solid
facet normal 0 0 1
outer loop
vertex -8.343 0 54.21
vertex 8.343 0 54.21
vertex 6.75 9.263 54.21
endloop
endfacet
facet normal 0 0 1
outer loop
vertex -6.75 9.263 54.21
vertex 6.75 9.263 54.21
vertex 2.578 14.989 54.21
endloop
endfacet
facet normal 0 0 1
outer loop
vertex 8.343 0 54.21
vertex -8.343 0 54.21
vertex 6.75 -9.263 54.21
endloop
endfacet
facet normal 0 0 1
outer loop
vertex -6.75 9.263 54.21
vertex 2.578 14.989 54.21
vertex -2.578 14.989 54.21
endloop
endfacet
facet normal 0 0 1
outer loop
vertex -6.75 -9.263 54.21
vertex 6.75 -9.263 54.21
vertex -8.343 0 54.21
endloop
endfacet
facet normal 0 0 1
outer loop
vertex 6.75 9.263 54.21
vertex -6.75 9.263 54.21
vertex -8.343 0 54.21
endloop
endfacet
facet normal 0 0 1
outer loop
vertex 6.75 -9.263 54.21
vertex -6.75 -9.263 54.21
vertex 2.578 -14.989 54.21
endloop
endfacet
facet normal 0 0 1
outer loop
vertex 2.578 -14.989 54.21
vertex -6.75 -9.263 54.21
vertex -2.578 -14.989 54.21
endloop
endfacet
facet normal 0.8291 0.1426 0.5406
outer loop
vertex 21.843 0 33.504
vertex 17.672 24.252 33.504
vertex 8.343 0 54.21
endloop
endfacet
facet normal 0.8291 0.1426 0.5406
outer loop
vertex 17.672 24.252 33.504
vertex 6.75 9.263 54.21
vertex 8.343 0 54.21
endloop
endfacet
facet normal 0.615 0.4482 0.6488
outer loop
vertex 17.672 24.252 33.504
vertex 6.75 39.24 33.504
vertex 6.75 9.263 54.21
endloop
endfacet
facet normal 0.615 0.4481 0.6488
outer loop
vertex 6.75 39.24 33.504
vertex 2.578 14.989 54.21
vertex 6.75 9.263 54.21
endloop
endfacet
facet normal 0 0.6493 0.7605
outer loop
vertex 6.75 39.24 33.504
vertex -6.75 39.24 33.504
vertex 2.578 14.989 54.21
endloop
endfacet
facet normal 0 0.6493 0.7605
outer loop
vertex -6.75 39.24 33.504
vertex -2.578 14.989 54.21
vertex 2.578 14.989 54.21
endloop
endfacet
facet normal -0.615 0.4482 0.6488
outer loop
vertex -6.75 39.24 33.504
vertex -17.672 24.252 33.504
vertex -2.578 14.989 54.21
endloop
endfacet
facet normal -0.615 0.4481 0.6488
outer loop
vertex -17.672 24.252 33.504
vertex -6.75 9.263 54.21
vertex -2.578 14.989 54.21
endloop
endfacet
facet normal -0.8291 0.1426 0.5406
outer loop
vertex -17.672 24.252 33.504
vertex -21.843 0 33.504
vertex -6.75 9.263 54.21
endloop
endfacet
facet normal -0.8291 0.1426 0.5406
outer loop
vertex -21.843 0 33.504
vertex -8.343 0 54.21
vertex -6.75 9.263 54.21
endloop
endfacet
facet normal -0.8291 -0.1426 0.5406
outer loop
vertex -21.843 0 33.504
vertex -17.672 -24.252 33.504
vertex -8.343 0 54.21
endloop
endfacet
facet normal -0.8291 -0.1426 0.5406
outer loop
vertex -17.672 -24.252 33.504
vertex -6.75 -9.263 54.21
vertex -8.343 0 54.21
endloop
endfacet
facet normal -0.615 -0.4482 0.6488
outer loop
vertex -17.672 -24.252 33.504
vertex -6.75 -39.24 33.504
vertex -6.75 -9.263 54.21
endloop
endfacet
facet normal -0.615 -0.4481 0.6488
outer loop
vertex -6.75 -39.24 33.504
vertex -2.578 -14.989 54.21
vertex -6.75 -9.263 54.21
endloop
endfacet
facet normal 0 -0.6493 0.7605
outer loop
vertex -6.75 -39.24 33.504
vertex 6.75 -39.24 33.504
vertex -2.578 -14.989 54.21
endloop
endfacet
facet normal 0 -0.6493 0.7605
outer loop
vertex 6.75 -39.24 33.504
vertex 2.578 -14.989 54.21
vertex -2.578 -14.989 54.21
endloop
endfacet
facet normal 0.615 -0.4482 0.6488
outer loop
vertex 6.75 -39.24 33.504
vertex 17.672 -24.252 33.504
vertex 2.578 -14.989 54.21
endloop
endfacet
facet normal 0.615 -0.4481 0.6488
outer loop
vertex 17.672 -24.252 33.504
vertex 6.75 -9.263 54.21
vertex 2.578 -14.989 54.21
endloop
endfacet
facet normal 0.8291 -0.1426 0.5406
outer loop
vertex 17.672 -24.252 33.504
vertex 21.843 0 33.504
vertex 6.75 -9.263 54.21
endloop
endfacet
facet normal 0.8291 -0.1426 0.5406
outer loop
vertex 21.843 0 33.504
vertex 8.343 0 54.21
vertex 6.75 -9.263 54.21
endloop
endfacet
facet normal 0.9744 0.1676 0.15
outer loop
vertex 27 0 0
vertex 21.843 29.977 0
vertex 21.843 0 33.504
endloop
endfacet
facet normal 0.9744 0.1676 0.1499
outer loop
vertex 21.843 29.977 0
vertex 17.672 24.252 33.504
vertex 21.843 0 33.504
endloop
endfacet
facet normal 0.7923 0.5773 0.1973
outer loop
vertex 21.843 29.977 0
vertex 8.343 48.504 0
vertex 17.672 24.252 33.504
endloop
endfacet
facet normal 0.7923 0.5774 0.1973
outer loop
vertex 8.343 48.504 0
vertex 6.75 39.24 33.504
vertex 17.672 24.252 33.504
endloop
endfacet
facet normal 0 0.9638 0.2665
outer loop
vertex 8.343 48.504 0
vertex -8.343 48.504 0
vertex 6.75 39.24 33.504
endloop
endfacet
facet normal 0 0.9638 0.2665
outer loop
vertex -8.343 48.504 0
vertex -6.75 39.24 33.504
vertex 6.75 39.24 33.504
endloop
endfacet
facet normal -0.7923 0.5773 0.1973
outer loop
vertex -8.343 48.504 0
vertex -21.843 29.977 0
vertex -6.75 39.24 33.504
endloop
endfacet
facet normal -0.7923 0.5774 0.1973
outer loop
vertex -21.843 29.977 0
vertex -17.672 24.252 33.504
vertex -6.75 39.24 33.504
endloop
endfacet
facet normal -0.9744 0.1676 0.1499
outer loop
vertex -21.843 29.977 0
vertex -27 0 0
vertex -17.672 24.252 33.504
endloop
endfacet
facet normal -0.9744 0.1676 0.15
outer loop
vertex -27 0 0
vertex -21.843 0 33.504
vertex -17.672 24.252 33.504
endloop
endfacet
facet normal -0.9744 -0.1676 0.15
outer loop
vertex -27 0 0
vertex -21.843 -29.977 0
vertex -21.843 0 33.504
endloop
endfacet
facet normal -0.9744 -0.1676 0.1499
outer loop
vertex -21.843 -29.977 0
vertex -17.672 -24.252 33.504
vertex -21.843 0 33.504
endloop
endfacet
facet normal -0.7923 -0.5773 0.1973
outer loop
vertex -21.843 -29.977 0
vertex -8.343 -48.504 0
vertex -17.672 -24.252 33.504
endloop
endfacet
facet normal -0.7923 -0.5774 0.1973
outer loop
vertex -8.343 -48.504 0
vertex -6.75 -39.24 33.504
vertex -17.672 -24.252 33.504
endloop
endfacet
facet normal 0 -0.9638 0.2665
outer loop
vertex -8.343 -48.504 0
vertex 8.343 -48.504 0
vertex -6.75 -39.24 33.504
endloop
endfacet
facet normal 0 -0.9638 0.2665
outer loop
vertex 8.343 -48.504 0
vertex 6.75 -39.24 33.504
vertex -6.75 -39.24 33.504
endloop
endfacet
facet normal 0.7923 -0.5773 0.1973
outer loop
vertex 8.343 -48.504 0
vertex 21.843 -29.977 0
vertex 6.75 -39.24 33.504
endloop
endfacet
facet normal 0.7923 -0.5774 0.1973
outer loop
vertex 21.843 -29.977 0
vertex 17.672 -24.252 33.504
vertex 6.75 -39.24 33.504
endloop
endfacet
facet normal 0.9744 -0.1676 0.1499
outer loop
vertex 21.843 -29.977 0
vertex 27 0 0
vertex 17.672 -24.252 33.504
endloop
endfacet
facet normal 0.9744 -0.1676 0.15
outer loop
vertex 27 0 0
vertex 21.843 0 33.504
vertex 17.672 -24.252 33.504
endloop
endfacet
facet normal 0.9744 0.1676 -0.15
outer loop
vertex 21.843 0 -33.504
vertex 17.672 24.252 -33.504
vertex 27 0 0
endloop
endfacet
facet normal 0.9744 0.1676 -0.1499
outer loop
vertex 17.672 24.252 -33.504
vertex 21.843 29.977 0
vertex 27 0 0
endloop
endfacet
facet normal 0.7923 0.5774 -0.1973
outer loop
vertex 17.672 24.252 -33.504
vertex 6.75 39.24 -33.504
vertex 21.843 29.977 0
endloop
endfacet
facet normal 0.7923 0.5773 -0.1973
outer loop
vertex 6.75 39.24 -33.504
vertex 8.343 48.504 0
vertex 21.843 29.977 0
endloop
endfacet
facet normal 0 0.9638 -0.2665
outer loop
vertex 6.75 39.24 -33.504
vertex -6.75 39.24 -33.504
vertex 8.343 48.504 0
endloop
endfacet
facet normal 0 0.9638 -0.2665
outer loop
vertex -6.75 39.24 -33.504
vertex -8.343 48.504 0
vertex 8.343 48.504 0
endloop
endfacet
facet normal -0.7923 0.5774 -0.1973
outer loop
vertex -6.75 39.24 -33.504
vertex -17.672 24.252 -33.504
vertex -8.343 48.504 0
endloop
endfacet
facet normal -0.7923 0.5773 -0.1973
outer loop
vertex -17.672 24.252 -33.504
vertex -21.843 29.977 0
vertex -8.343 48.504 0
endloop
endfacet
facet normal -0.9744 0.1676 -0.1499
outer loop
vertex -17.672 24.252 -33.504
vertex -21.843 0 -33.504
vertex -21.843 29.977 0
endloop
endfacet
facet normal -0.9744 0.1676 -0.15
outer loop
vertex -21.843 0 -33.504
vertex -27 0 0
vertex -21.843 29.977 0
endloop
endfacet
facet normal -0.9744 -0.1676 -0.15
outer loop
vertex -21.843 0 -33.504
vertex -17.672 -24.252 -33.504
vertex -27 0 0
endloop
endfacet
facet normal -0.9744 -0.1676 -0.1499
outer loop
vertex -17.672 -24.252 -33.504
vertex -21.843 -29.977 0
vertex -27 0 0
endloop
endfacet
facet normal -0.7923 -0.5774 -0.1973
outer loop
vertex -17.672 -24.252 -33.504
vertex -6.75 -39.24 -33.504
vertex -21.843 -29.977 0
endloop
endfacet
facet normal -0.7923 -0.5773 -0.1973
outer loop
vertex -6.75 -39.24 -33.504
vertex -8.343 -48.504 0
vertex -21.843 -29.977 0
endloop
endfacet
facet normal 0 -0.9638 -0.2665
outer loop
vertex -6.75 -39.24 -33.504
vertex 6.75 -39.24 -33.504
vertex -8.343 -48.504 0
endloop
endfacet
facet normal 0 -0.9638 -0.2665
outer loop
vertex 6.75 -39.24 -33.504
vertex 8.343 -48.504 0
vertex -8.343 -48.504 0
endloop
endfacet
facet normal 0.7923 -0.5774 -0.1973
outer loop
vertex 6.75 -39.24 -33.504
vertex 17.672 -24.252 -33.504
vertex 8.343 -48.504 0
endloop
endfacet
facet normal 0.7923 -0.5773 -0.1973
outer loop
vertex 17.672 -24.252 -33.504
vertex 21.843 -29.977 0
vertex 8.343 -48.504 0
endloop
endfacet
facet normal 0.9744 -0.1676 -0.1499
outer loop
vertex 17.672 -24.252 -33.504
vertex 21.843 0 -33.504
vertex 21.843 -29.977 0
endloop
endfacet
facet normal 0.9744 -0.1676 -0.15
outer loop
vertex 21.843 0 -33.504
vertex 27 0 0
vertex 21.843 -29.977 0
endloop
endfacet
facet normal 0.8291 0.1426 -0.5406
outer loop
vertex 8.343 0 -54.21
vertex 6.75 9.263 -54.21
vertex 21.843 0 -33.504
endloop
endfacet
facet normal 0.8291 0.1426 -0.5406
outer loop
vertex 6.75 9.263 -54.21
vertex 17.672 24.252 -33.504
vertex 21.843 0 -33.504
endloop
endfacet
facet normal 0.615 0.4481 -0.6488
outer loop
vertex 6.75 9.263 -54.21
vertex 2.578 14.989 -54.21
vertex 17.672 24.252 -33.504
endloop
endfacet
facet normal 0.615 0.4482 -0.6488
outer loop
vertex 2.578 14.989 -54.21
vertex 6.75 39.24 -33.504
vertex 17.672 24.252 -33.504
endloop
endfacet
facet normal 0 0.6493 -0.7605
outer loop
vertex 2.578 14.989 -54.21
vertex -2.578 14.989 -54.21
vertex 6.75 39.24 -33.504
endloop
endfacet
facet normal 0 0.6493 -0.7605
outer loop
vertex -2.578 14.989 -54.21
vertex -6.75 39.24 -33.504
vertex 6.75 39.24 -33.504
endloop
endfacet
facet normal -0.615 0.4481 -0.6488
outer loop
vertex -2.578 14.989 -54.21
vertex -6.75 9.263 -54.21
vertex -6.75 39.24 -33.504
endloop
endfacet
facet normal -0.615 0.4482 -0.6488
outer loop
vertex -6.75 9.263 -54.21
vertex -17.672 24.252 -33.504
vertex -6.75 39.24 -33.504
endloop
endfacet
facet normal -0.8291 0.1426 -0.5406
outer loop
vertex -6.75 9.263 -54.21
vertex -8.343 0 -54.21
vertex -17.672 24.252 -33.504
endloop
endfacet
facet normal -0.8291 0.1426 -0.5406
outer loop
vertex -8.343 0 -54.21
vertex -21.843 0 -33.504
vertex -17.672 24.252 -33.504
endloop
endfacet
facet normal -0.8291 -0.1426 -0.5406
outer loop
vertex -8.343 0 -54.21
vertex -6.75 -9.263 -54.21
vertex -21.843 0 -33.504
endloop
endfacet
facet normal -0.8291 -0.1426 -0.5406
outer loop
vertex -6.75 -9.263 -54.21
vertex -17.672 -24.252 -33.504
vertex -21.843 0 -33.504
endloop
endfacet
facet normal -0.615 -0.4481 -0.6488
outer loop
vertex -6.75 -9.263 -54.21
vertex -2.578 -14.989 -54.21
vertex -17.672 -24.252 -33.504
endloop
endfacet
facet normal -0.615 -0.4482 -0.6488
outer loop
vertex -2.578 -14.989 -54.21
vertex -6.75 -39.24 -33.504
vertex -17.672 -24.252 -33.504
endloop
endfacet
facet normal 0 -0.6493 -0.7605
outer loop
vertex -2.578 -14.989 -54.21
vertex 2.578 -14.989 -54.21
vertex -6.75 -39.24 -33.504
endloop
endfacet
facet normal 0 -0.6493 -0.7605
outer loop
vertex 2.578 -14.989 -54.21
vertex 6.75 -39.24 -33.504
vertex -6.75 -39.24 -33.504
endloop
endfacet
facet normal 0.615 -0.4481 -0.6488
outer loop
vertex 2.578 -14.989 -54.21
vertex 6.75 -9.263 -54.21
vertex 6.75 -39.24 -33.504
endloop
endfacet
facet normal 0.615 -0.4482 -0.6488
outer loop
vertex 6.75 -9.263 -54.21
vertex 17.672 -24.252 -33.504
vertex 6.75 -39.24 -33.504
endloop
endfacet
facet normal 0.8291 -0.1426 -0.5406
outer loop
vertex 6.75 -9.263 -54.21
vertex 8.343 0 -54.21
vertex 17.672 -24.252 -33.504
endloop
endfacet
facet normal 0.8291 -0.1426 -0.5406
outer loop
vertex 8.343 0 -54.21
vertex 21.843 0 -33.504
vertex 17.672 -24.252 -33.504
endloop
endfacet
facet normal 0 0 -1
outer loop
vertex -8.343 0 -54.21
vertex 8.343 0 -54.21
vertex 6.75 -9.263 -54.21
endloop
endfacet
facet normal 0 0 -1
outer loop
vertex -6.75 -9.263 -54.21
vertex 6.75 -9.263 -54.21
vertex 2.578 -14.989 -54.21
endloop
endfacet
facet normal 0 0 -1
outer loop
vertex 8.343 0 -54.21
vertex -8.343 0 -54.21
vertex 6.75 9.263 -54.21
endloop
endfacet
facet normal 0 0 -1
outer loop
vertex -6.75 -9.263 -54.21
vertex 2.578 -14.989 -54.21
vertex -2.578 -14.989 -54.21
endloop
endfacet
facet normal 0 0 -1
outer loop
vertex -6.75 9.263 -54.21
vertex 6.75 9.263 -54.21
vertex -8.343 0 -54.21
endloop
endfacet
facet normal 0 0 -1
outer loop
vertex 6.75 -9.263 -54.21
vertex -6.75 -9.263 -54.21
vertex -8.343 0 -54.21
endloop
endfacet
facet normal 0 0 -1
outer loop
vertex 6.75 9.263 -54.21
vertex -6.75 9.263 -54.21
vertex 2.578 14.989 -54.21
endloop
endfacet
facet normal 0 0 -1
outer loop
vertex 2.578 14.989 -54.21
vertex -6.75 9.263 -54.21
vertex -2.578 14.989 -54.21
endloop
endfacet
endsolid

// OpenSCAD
// Generated by SolidPython 1.0.1 on 2020-07-29 00:46:49


scale(v = [9, 17, 19]) {
	sphere(r = 3);
}
/***********************************************
*********      SolidPython code:      **********
************************************************
 
# import packages: SolidPython
from solid import *
from solid.utils import *
from itertools import chain, combinations, permutations


class Resize:

    def __init__(self, scad_file):
        self.scad_file = scad_file
        #self.scad_file = import_scad(scad_file)
        # cone/cylinder param:
        self.r1 = 0
        self.r2 = 0
        self.h = 0
        # rectangular prism param:
        self.w = 0
        self.l = 0
        # ellipse param:
        self.r = 0

    # import OpenScad code (file name corresponds to shape)


    # classify shape + parameters
    def assign(self, param1, param2, param3):
        if self.scad_file == 'cone.scad':
            self.r1 = param1
            self.r2 = param2
            self.h = param3
        elif self.scad_file == 'cylinder.scad':
            self.r1 = param1
            self.r2 = param2
            self.h = param3
        elif self.scad_file == 'rectangularPrism.scad':
            self.h = param1
            self.l = param2
            self.w = param3
        else:
            self.r = param1
            self.h = param2

    # resize parameters
    def iterate(self):
        x = range(3, 20, 2)
        i = 1
        if self.scad_file == 'cone.scad':
            tempList = list(permutations(x, 2))
            for temp in tempList:
                param1 = temp[0]
                param2 = temp[1]
                filepath = 'produced_scad_files/' + 'cone' + str(param1) + '_' + str(param2) + '_' + '.scad'
                scad_render_to_file(cylinder(h=param1, r1=param2, r2=0), filepath)

        elif self.scad_file == 'cylinder.scad':
            tempList = list(permutations(x, 3))
            for temp in tempList:
                param1 = temp[0]
                param2 = temp[1]
                filepath = 'produced_scad_files/' + 'cylinder' + str(param1) + '_' + str(param2) + '_' + '.scad'
                scad_render_to_file(cylinder(h=param1, r1=param2, r2=param2), filepath)

        elif self.scad_file == 'rectangularPrism.scad':
            tempList = list(permutations(x, 3))
            for temp in tempList:
                param1 = temp[0]
                param2 = temp[1]
                param3 = temp[2]
                filepath = 'produced_scad_files/' + 'rectangularPrism' + str(param1) + '_' + str(param2) + '_' + str(
                    param3) + '.scad'
                scad_render_to_file(cube(size=(param1, param2, param3)), filepath)

        elif self.scad_file == 'ellipse.scad':
            tempList = list(permutations(x, 4))
            for temp in tempList:
                param1 = temp[0]
                param2 = temp[1]
                param3 = temp[2]
                param4 = temp[3]
                filepath = 'produced_scad_files/' + 'ellipse' + str(param1) + '_' + str(param2) + '_' + str(param3) + '_' + str(param4) + '.scad'
                scad_render_to_file(scale([param1, param2, param3])(sphere(r=param4)), filepath)

    def render_to_scadfile(self):
        scad_render_to_file(scad, 'example.scad') 
 
************************************************/
